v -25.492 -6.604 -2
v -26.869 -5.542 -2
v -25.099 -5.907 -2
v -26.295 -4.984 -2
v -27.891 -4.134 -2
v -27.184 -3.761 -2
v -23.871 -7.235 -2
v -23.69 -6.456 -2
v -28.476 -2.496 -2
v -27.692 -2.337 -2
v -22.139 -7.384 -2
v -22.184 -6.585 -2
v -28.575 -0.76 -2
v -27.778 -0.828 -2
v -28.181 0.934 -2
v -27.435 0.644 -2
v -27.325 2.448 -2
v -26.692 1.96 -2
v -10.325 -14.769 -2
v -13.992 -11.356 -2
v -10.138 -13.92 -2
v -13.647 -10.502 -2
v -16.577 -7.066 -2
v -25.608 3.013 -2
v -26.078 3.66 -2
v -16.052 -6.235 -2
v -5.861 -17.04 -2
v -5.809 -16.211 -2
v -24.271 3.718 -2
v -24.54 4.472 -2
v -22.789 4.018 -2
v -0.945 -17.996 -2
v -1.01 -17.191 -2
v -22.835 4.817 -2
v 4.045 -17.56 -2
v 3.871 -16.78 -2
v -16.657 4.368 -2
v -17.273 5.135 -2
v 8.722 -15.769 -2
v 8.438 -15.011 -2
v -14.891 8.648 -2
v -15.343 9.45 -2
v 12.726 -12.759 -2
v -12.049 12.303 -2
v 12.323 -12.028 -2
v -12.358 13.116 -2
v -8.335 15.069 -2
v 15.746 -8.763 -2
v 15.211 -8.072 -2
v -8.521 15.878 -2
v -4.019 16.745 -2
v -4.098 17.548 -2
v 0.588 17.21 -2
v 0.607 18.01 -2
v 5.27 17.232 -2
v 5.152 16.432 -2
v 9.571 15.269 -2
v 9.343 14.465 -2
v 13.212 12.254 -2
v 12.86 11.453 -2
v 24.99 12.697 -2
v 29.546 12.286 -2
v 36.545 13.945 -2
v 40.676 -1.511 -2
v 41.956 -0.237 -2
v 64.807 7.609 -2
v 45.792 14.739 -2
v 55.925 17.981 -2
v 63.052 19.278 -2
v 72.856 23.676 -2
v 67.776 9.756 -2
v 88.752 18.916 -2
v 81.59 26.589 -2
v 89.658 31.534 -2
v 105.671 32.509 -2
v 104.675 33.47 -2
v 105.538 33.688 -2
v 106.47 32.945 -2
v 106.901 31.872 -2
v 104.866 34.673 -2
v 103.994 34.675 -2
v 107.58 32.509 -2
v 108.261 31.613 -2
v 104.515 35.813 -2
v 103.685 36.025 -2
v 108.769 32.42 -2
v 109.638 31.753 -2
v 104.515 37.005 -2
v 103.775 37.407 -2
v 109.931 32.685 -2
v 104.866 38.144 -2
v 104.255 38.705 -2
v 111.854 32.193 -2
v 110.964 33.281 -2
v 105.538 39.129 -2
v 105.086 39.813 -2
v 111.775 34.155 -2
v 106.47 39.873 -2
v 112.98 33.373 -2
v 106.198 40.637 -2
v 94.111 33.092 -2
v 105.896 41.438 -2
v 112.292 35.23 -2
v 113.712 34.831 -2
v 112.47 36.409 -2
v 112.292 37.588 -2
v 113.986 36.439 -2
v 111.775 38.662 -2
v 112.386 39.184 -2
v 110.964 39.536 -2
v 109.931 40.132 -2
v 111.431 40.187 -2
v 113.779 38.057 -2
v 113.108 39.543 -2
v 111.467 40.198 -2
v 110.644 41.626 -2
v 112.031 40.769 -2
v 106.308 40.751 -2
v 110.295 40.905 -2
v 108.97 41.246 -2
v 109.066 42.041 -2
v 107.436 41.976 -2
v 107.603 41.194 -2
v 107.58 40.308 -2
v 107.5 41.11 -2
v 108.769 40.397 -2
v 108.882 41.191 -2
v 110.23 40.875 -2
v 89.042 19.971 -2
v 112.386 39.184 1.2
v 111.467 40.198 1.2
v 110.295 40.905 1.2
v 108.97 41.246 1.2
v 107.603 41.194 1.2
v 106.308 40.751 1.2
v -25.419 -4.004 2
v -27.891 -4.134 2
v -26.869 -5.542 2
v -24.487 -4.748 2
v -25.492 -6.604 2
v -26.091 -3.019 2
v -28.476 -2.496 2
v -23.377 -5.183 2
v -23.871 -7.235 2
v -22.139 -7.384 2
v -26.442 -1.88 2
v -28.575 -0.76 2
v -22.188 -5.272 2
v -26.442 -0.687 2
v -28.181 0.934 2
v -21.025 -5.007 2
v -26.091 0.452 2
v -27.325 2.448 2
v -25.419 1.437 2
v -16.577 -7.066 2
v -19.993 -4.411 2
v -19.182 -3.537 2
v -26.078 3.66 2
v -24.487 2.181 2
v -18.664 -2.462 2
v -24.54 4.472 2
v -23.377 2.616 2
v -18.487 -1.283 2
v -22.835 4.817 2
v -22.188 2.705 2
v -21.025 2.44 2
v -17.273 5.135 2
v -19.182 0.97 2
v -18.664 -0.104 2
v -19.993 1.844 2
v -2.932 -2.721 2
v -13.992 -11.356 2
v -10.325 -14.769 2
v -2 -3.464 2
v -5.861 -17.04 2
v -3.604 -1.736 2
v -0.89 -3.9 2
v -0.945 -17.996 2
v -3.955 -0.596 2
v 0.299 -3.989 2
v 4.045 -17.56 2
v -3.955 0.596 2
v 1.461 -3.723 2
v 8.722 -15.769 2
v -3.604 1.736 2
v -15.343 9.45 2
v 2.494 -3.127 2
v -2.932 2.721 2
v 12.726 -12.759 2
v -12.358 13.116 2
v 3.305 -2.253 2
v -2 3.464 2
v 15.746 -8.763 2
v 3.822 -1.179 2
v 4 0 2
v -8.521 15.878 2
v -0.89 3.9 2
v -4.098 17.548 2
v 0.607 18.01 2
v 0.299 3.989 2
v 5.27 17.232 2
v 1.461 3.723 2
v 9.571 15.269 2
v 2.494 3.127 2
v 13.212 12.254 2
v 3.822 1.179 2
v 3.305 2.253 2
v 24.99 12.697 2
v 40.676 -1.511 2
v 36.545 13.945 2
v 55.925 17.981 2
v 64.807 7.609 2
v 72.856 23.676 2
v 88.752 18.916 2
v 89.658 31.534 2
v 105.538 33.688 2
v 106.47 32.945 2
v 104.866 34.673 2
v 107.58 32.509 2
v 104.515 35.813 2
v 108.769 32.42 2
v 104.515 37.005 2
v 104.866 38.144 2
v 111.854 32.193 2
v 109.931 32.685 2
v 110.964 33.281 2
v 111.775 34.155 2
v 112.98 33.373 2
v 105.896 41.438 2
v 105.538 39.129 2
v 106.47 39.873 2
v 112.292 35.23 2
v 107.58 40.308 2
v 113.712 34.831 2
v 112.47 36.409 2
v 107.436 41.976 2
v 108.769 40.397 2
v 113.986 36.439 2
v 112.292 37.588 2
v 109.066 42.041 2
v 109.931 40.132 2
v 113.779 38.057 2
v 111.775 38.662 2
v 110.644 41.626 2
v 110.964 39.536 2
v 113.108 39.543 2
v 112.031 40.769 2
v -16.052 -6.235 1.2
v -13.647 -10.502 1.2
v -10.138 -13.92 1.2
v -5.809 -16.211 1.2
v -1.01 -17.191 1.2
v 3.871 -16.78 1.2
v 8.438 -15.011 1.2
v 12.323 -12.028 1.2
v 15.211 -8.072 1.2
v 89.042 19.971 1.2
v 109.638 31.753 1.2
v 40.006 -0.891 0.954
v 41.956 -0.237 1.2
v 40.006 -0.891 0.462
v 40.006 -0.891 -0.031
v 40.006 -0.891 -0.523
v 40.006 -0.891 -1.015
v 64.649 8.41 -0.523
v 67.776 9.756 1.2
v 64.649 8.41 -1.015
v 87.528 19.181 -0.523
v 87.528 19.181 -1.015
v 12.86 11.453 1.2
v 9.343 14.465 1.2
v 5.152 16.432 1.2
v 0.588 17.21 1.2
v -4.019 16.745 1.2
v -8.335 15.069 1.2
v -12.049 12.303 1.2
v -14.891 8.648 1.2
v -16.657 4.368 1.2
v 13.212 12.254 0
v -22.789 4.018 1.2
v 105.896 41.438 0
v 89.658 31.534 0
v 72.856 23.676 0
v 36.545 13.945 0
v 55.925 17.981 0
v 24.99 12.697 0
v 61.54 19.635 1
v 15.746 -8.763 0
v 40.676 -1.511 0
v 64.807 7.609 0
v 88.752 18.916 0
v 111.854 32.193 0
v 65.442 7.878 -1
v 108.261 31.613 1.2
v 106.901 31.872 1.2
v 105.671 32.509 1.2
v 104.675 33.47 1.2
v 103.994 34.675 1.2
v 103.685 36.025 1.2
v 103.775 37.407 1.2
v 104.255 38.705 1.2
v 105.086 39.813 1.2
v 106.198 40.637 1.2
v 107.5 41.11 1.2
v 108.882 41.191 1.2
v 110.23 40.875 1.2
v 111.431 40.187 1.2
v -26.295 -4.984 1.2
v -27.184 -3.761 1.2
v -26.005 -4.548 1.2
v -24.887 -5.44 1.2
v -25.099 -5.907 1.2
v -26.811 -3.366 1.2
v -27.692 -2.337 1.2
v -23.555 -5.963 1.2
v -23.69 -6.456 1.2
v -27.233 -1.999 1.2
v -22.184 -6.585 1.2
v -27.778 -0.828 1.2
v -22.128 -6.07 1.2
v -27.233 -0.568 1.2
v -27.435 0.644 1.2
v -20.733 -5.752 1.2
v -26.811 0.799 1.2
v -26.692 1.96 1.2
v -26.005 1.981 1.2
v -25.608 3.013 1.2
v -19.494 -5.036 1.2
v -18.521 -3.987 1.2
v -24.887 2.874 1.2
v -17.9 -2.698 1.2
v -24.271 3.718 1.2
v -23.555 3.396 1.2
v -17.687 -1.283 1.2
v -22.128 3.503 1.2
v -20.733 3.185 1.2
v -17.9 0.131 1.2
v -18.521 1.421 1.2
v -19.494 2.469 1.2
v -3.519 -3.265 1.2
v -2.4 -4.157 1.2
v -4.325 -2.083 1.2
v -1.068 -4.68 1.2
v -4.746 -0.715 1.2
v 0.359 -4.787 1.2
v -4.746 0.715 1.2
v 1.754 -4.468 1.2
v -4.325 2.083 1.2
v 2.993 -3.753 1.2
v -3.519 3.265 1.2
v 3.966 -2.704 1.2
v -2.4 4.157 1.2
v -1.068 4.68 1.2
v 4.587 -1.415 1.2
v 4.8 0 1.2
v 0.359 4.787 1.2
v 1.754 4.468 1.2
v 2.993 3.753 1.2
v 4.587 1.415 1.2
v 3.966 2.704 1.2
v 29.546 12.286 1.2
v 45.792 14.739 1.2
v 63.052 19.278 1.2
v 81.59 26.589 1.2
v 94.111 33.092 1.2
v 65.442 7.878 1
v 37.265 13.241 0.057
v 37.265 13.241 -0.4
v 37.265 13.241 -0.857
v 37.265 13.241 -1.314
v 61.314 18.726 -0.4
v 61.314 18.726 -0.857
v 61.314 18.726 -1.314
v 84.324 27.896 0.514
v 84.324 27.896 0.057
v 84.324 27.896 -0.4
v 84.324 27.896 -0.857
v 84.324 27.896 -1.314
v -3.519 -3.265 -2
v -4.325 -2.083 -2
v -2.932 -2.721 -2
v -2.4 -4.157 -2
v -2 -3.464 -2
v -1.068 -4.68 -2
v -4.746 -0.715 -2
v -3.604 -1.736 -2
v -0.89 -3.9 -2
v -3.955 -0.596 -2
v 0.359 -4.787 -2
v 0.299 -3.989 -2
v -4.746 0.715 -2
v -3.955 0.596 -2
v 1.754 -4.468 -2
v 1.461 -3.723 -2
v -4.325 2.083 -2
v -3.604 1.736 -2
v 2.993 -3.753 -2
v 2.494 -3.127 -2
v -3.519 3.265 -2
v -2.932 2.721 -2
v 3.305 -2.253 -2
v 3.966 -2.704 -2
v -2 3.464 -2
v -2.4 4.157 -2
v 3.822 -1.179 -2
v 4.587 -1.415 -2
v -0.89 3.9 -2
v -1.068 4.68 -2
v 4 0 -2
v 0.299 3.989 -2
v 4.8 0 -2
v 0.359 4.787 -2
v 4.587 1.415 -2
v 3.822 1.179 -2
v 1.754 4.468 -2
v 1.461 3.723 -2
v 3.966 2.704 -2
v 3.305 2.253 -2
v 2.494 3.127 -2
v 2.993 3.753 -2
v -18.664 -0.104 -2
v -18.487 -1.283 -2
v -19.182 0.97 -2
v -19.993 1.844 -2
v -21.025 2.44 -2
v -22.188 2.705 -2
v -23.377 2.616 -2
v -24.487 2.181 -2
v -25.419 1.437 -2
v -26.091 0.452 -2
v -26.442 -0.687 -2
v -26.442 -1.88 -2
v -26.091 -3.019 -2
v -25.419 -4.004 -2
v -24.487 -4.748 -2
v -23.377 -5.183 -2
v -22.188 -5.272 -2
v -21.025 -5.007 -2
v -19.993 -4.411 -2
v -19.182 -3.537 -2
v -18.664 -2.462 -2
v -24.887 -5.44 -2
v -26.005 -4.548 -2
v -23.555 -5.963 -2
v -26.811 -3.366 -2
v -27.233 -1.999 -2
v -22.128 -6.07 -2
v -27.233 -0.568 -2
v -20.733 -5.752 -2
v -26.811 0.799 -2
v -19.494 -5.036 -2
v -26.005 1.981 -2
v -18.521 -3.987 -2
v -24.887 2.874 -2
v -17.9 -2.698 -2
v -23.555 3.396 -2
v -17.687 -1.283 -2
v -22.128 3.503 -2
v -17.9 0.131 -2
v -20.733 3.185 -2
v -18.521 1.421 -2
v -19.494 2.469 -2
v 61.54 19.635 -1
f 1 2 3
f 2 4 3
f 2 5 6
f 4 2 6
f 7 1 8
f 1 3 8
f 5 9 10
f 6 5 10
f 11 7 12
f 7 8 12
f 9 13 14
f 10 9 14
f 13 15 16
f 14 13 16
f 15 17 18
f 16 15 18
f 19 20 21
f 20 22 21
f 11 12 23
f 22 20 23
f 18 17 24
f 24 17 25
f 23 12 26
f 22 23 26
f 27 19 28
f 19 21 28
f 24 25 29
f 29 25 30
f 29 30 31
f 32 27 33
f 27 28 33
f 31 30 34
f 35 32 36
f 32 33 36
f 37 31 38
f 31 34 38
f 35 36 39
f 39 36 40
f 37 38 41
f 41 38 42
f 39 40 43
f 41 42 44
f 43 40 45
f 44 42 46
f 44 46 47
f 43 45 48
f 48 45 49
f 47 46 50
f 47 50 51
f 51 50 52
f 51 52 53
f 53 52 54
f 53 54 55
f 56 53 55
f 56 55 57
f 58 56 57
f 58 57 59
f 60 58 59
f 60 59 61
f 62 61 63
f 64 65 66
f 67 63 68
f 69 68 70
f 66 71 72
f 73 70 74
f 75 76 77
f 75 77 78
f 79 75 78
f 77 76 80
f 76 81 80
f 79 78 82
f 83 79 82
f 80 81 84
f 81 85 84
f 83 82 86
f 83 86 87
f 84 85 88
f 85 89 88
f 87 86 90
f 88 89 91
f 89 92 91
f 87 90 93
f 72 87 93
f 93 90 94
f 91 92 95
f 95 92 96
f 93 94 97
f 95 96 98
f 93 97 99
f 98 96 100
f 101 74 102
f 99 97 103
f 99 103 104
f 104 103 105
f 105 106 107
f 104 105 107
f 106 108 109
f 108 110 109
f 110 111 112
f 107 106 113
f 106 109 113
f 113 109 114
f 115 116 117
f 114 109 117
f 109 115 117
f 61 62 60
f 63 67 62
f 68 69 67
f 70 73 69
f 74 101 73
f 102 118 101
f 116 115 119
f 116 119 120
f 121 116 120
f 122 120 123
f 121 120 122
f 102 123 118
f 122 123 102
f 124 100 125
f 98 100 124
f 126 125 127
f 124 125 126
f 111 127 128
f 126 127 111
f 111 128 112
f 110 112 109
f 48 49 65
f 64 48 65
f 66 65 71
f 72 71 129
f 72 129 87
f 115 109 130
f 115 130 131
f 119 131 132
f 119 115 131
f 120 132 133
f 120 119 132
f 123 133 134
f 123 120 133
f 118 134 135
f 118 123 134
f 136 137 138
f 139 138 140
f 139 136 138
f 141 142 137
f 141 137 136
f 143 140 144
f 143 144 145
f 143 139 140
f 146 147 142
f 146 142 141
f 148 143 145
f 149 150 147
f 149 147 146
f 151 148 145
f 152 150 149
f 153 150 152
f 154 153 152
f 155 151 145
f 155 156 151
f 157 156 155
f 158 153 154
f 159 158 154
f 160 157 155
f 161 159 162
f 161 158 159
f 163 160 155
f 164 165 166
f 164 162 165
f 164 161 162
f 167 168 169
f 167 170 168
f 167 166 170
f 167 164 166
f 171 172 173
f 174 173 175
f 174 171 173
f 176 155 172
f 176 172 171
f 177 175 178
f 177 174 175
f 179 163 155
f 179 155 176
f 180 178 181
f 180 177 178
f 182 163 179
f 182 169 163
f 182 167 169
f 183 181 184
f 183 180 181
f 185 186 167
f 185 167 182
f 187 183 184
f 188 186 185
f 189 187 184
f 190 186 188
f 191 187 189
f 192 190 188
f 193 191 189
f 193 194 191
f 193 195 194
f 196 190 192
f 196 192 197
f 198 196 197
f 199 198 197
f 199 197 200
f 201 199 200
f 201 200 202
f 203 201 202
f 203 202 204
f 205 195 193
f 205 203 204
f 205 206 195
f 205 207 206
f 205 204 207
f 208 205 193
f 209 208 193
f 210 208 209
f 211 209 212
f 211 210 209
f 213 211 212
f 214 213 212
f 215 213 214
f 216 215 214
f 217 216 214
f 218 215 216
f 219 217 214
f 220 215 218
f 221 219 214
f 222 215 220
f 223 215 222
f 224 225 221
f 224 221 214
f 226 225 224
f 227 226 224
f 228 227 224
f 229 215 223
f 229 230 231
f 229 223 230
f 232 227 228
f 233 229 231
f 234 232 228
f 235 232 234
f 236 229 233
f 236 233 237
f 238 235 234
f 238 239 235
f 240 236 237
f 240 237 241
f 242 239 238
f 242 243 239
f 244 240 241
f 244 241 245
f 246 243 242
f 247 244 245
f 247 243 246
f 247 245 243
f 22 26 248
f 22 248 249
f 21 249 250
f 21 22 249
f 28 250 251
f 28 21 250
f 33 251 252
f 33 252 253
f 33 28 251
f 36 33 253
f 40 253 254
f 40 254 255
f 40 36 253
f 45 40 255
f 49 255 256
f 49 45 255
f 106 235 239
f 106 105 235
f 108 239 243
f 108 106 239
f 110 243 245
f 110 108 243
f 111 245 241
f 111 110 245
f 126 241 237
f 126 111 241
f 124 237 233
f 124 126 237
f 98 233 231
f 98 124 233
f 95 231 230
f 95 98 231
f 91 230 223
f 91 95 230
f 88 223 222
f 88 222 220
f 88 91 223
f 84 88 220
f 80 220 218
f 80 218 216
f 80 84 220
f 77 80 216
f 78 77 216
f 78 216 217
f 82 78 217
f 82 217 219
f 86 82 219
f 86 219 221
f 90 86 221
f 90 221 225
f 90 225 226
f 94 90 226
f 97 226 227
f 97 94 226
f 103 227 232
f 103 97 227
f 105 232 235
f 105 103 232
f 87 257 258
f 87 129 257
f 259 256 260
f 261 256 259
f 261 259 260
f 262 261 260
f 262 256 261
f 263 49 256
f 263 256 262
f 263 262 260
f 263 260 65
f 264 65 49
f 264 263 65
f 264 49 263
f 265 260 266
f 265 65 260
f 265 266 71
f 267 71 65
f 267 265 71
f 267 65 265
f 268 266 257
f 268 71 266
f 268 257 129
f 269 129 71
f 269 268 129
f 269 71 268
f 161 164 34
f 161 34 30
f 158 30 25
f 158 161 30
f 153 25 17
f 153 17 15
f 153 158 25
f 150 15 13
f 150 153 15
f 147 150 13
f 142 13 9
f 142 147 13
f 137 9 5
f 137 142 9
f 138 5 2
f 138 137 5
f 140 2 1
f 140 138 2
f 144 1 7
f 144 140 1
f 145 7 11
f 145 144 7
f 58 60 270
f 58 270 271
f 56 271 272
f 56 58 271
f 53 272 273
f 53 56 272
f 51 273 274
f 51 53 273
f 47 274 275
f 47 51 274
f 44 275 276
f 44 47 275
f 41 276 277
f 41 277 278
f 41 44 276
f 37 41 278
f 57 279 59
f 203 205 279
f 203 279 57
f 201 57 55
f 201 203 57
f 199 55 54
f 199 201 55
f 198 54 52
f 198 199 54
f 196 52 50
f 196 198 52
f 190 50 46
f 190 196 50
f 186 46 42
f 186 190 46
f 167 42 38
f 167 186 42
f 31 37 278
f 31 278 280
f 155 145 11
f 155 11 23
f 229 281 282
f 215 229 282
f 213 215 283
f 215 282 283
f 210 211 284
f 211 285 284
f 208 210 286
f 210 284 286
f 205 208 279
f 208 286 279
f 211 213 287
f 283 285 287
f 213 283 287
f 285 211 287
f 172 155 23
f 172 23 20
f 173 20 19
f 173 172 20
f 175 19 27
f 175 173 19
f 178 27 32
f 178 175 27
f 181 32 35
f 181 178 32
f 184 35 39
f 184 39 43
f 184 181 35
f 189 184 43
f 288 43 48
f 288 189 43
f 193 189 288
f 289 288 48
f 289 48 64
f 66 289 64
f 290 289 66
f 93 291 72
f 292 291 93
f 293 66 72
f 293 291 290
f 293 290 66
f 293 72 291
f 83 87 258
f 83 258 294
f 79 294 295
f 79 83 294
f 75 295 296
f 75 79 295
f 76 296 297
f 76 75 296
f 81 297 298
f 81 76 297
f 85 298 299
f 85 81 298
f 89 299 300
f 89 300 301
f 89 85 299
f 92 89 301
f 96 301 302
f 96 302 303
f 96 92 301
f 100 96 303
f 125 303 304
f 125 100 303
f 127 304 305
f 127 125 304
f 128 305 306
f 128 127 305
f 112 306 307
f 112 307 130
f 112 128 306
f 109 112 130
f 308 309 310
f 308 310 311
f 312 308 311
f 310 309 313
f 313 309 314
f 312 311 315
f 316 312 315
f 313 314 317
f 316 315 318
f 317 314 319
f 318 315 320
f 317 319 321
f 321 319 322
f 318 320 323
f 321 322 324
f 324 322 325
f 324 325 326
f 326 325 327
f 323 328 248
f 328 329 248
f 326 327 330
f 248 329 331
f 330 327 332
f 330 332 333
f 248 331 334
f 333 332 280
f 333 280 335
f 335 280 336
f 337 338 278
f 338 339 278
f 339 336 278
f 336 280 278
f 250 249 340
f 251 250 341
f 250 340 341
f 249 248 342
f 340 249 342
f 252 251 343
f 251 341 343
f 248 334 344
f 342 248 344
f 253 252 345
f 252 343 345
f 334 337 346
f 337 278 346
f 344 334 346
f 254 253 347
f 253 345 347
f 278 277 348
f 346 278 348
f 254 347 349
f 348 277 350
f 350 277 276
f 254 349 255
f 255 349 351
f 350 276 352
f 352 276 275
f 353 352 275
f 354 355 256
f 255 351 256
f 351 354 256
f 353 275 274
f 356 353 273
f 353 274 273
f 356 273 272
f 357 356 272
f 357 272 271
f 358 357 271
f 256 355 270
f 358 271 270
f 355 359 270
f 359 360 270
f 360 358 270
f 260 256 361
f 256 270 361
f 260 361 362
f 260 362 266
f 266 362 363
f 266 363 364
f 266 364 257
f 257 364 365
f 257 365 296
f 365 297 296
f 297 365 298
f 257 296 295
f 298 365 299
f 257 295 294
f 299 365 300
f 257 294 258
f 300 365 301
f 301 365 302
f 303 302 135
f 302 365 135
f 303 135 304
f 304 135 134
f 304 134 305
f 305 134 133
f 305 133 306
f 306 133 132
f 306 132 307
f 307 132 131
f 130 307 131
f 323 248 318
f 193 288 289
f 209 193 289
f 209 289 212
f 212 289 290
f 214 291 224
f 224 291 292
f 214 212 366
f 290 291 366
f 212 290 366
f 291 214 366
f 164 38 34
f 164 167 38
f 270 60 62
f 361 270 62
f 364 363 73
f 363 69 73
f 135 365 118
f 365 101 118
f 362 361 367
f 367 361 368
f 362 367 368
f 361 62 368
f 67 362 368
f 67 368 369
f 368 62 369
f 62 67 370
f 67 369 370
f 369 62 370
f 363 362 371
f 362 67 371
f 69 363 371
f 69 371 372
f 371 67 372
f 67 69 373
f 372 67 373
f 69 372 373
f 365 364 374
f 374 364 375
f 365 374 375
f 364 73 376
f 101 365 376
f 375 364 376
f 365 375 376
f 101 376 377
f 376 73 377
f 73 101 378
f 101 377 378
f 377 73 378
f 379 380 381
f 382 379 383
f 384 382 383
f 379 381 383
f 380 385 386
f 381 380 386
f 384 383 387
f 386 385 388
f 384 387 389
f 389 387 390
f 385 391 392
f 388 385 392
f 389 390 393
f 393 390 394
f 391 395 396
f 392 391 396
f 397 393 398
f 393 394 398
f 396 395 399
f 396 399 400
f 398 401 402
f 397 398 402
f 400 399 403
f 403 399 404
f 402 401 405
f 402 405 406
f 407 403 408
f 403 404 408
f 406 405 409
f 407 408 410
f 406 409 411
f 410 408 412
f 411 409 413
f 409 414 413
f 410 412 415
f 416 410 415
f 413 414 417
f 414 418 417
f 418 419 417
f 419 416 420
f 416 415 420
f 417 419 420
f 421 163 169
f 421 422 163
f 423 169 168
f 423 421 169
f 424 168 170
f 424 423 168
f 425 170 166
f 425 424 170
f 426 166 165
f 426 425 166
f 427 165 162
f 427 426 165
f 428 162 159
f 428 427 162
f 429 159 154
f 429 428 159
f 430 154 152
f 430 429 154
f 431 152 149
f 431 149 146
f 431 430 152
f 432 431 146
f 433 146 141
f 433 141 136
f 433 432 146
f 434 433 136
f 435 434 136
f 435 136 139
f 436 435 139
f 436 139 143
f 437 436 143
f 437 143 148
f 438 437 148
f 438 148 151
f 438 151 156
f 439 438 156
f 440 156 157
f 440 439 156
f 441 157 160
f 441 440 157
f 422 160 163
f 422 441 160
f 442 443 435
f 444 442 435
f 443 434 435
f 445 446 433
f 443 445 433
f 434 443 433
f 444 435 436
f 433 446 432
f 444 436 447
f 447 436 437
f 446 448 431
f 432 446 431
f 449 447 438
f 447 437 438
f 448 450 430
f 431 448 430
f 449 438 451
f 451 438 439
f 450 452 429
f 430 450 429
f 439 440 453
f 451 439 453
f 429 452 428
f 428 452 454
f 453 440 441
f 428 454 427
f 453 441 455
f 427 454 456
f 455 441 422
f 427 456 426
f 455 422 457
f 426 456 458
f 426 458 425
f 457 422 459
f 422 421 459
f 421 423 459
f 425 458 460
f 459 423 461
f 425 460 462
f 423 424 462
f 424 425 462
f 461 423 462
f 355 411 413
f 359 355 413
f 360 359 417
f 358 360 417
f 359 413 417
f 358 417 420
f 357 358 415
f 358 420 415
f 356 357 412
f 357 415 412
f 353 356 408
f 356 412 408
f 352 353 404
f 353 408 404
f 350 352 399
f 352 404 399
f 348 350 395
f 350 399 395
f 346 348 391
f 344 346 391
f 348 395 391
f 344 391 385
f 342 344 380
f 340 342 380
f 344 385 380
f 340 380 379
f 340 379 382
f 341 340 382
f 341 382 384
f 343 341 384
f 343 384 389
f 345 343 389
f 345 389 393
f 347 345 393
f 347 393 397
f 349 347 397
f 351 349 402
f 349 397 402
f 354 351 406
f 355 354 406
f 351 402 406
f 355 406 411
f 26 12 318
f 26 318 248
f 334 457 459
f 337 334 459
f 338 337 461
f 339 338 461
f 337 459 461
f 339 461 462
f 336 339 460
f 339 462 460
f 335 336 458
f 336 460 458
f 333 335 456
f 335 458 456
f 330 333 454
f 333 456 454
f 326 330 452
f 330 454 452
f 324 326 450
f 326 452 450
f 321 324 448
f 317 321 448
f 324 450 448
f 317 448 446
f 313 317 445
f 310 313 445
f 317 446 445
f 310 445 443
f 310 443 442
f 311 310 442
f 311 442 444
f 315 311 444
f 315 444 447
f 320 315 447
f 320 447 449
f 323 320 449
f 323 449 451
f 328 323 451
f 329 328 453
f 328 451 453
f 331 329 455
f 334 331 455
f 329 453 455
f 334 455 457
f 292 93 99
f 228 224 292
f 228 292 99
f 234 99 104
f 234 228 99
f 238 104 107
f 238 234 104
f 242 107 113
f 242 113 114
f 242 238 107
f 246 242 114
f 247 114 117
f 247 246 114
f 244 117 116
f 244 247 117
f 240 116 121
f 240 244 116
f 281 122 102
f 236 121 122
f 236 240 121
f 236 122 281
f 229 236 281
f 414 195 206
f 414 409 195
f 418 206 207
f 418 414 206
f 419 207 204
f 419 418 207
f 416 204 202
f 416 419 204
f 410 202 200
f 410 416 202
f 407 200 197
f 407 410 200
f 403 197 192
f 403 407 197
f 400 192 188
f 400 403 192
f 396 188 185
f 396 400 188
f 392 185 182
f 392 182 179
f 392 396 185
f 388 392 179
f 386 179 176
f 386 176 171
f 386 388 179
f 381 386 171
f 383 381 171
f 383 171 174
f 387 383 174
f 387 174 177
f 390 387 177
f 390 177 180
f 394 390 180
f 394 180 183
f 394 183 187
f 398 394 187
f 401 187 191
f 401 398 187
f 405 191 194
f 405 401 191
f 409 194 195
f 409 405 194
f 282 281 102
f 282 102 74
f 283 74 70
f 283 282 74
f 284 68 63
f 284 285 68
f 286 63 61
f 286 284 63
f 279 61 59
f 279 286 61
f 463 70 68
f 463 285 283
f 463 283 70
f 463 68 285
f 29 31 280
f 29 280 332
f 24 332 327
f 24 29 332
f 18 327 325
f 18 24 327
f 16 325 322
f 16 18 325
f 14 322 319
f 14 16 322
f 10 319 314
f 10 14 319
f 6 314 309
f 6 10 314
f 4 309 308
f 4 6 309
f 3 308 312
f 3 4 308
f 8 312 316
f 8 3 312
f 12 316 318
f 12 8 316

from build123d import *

# Parameters (mm, degrees)
SKETCH1_R           = 4
BOSS_EXTRUDE1_DEPTH = 2
SHELL1_START        = -2
SHELL1_OUTLINE_R    = 4.8
SHELL1_DEPTH        = 3.2


# Read off the part's stored shape, not the designer's step: Shell1
with BuildPart() as part:
    # Sketch1 → Boss-Extrude1 (new, symmetric)
    with BuildSketch(Plane.XY):
        with BuildLine():
            Line((-17.273333042, 5.134508518), (-22.834943086, 4.817083449))
            ThreePointArc((-22.834943086, 4.817083449), (-28.587261134, -1.63159827), (-22.138579415, -7.383916318))
            Line((-22.138579415, -7.383916318), (-16.576969371, -7.066491249))
            ThreePointArc((-16.576969371, -7.066491249), (-0.944763396, -17.995517059), (15.7458991, -8.7634396))
            add(Edge.make_bspline(
                [(15.7458991, -8.7634396), (67.083909385, 4.041585312), (111.853607553, 32.193205755)],
                knots=[0, 0, 0, 1, 1, 1], degree=2))
            ThreePointArc((111.853607553, 32.193205755), (113.10751986, 39.543134952), (105.896265572, 41.438277917))
            add(Edge.make_bspline(
                [(105.896265572, 41.438277917), (63.525953211, 12.424095607), (13.212454281, 12.254071322)],
                knots=[0.987896241, 0.987896241, 0.987896241, 1.987896241, 1.987896241, 1.987896241], degree=2))
            ThreePointArc((13.212454281, 12.254071322), (-4.098137102, 17.548119112), (-17.273333042, 5.134508518))
        make_face()
        with Locations((-22.486761251, -1.283416434)):
            Circle(SKETCH1_R, mode=Mode.SUBTRACT)
        Circle(SKETCH1_R, mode=Mode.SUBTRACT)
        with Locations((108.469927907, 36.408671583)):
            Circle(SKETCH1_R, mode=Mode.SUBTRACT)
    extrude(amount=BOSS_EXTRUDE1_DEPTH, both=True)

    # Shell1 outline → Shell1 (cut)
    with BuildSketch(Plane.XY.offset(SHELL1_START)):
        with BuildLine():
            ThreePointArc((-16.051816298, -6.235216567), (-1.010183418, -17.190644594), (15.211053739, -8.072334002))
            add(Edge.make_bspline(
                [(15.211053739, -8.072334002), (15.222385933, -8.06950746), (15.233718127, -8.066680918), (15.245050322, -8.063854377), (15.256382516, -8.061027835), (15.26771471, -8.058201293), (15.279046904, -8.055374751), (15.290379098, -8.05254821), (15.301711293, -8.049721668), (15.313043487, -8.046895126), (15.324375681, -8.044068584), (15.354121011, -8.036649331), (15.372534147, -8.03205662), (15.390947283, -8.027463909), (15.409360418, -8.022871197), (15.427773554, -8.018278486), (15.44618669, -8.013685775), (15.464599826, -8.009093063), (15.483012962, -8.004500352), (15.501426097, -7.999907641), (15.519839233, -7.995314929), (15.540554011, -7.990148129), (15.542858699, -7.989573289), (15.545136117, -7.989005183), (15.547530208, -7.988408212), (15.549617399, -7.987887312), (15.552237019, -7.987234194), (15.554249413, -7.98673216), (15.556693958, -7.986122386), (15.558944951, -7.985560901), (15.5612476, -7.984986493), (15.56583998, -7.983840868), (15.568136163, -7.983268038), (15.570432338, -7.982695192), (15.572728507, -7.982122328), (15.575024668, -7.981549448), (15.577320821, -7.980976551), (15.579616968, -7.980403637), (15.581913107, -7.979830706), (15.584209239, -7.979257758), (15.586505364, -7.978684793), (15.593393716, -7.976965848), (15.597985921, -7.975819817), (15.602578098, -7.974673718), (15.607170246, -7.973527552), (15.611762364, -7.972381317), (15.616354454, -7.971235016), (15.620946514, -7.970088646), (15.625538546, -7.968942209), (15.630130548, -7.967795704), (15.634722521, -7.966649131), (15.648498354, -7.96320921), (15.657682126, -7.960915659), (15.666865782, -7.958621837), (15.676049322, -7.956327744), (15.685232745, -7.954033381), (15.694416052, -7.951738746), (15.703599244, -7.949443841), (15.712782318, -7.947148666), (15.721965277, -7.944853219), (15.731148119, -7.942557502), (15.77706175, -7.931077562), (15.813790795, -7.921889279), (15.85051798, -7.912696664), (15.887243306, -7.903499717), (15.923966772, -7.894298439), (15.960688378, -7.885092829), (15.997408124, -7.875882887), (16.034126012, -7.866668613), (16.070842039, -7.857450008), (16.107556207, -7.848227071), (16.291117748, -7.802090727), (16.437937227, -7.765112345), (16.584726952, -7.728064656), (16.731486924, -7.690947659), (16.878217144, -7.653761355), (17.02491761, -7.616505744), (17.171588325, -7.579180826), (17.318229287, -7.5417866), (17.464840497, -7.504323068), (17.611421956, -7.466790228), (18.05107708, -7.353983788), (18.34406149, -7.278502266), (18.636926899, -7.202743515), (18.929673307, -7.126707537), (19.222300717, -7.050394331), (19.514809132, -6.973803896), (19.807198553, -6.896936234), (20.099468984, -6.819791344), (20.391620426, -6.742369227), (20.683652882, -6.664669882), (21.559393298, -6.430740165), (22.142744307, -6.273678112), (22.725619399, -6.11550715), (23.308018593, -5.956227279), (23.889941907, -5.795838499), (24.471389362, -5.63434081), (25.052360976, -5.471734213), (25.632856767, -5.308018707), (26.212876755, -5.143194292), (26.792420958, -4.977260969), (28.529626269, -4.476134272), (29.68586008, -4.137614183), (30.84019098, -3.794658457), (31.992619122, -3.447267078), (33.143144661, -3.095440033), (34.29176775, -2.739177308), (35.438488542, -2.378478888), (36.583307191, -2.01334476), (37.726223851, -1.64377491), (38.867238673, -1.269769323), (42.284578093, -0.134445311), (44.55519768, 0.640180196), (46.818211791, 1.432548876), (49.073621643, 2.242661072), (51.32142845, 3.070517125), (53.561633431, 3.916117378), (55.794237801, 4.779462172), (58.019242777, 5.660551849), (60.236649574, 6.559386751), (62.44645941, 7.47596722), (68.878655155, 10.20493448), (73.080612538, 12.065048094), (77.254554243, 13.99063813), (81.400488497, 15.981708647), (85.518423161, 18.038264067), (89.608365726, 20.16030918), (93.67032332, 22.347849143), (97.704302702, 24.600889477), (101.710310261, 26.919436071), (105.688352025, 29.30349518), (109.638433649, 31.753073424)],
                knots=[-0.003323428, -0.003323428, -0.003323428, -0.003323428, -0.003323428, -0.003323428, -0.003323428, -0.003323428, -0.003323428, -0.003323428, -0.003323428, -0.003323428, -0.002109375, -0.002109375, -0.002109375, -0.002109375, -0.002109375, -0.002109375, -0.002109375, -0.002109375, -0.002109375, -0.002109375, -0.000136719, -0.000136719, -0.000136719, -0.000136719, -0.000136719, -0.000136719, -0.000136719, -0.000136719, -0.000136719, -0.000136719, 0.000109863, 0.000109863, 0.000109863, 0.000109863, 0.000109863, 0.000109863, 0.000109863, 0.000109863, 0.000109863, 0.000109863, 0.000356445, 0.000356445, 0.000356445, 0.000356445, 0.000356445, 0.000356445, 0.000356445, 0.000356445, 0.000356445, 0.000356445, 0.000849609, 0.000849609, 0.000849609, 0.000849609, 0.000849609, 0.000849609, 0.000849609, 0.000849609, 0.000849609, 0.000849609, 0.001835937, 0.001835937, 0.001835937, 0.001835937, 0.001835937, 0.001835937, 0.001835937, 0.001835937, 0.001835937, 0.001835937, 0.00578125, 0.00578125, 0.00578125, 0.00578125, 0.00578125, 0.00578125, 0.00578125, 0.00578125, 0.00578125, 0.00578125, 0.0215625, 0.0215625, 0.0215625, 0.0215625, 0.0215625, 0.0215625, 0.0215625, 0.0215625, 0.0215625, 0.0215625, 0.053125, 0.053125, 0.053125, 0.053125, 0.053125, 0.053125, 0.053125, 0.053125, 0.053125, 0.053125, 0.11625, 0.11625, 0.11625, 0.11625, 0.11625, 0.11625, 0.11625, 0.11625, 0.11625, 0.11625, 0.2425, 0.2425, 0.2425, 0.2425, 0.2425, 0.2425, 0.2425, 0.2425, 0.2425, 0.2425, 0.495, 0.495, 0.495, 0.495, 0.495, 0.495, 0.495, 0.495, 0.495, 0.495, 0.979998426, 0.979998426, 0.979998426, 0.979998426, 0.979998426, 0.979998426, 0.979998426, 0.979998426, 0.979998426, 0.979998426, 0.979998426, 0.979998426], degree=11))
            ThreePointArc((109.638433649, 31.753073424), (103.967828672, 38.073334454), (112.386109536, 39.184193417))
            ThreePointArc((112.386109536, 39.184193417), (109.645338699, 41.123948782), (106.30837764, 40.75089845))
            add(Edge.make_bspline(
                [(12.859642213, 11.452874497), (12.875559482, 11.452928286), (12.89147675, 11.452982075), (12.907394019, 11.453035864), (12.923311287, 11.453089654), (12.939228556, 11.453143443), (12.955145825, 11.453197232), (12.971063093, 11.453251021), (12.986980362, 11.45330481), (13.024953461, 11.453433133), (13.047009292, 11.453507666), (13.069065122, 11.453582199), (13.091120953, 11.453656732), (13.113176784, 11.453731266), (13.135232614, 11.453805799), (13.157288445, 11.453880332), (13.179344276, 11.453954865), (13.202778596, 11.454034057), (13.204157085, 11.454038715), (13.205535575, 11.454043373), (13.206914064, 11.454048032), (13.208292554, 11.45405269), (13.209671043, 11.454057348), (13.211049532, 11.454062007), (13.212428022, 11.454066665), (13.215185001, 11.454075982), (13.216554492, 11.454080606), (13.217987164, 11.45408545), (13.219302057, 11.454089949), (13.220750975, 11.45409485), (13.222097481, 11.454099473), (13.223496126, 11.454104254), (13.224878499, 11.454109002), (13.229032762, 11.454123302), (13.231802257, 11.454132885), (13.234571739, 11.454142516), (13.237341208, 11.454152197), (13.240110663, 11.454161926), (13.242880105, 11.454171704), (13.245649534, 11.454181531), (13.248418949, 11.454191408), (13.256727156, 11.454221183), (13.262265907, 11.454241229), (13.267804605, 11.454261471), (13.273343249, 11.454281908), (13.278881841, 11.454302541), (13.284420379, 11.45432337), (13.289958865, 11.454344395), (13.295497296, 11.454365616), (13.312112433, 11.454429865), (13.323188978, 11.45447348), (13.33426531, 11.454517879), (13.345341429, 11.45456306), (13.356417336, 11.454609025), (13.36749303, 11.454655773), (13.378568511, 11.454703304), (13.389643779, 11.454751618), (13.445019058, 11.454997102), (13.489315877, 11.455206018), (13.533609292, 11.455427463), (13.577899303, 11.455661437), (13.62218591, 11.455907939), (13.666469113, 11.45616697), (13.710748913, 11.456438529), (13.755025308, 11.456722618), (13.976390262, 11.458205705), (14.153427758, 11.459592636), (14.330410785, 11.461180031), (14.50733934, 11.46296789), (14.684213418, 11.464956217), (14.861033018, 11.467145013), (15.037798135, 11.469534279), (15.214508768, 11.472124018), (15.7444772, 11.480494658), (16.097571535, 11.486876983), (16.450447892, 11.494061221), (16.803106245, 11.502047384), (17.155546567, 11.510835488), (17.507768833, 11.520425545), (17.859773016, 11.53081757), (18.211559091, 11.542011578), (19.266262913, 11.577999586), (19.968526266, 11.605199584), (20.669916866, 11.635607671), (21.370434487, 11.669223941), (22.070078905, 11.706048488), (22.768849895, 11.746081409), (23.466747231, 11.789322799), (24.163770688, 11.835772751), (26.252218749, 11.984748583), (27.641021145, 12.096900641), (29.026325206, 12.221887985), (30.408128907, 12.359711064), (31.786430221, 12.510370327), (33.161227125, 12.673866223), (34.532517592, 12.850199202), (35.900299598, 13.039369712), (39.993114157, 13.645395185), (42.707615071, 14.100763008), (45.408056156, 14.607483418), (48.094419774, 15.16555678), (50.76668835, 15.774982078), (53.424844378, 16.435756921), (56.068870417, 17.147877537), (58.698749092, 17.911338773), (66.541035798, 20.354212331), (71.711057703, 22.187245864), (76.824392267, 24.225184187), (81.880917363, 26.467954887), (86.880527203, 28.915468978), (91.823134257, 31.567626244), (96.708671175, 34.424320569), (101.53709271, 37.485445273), (106.30837764, 40.75089845)],
                knots=[-0.003533003, -0.003533003, -0.003533003, -0.003533003, -0.003533003, -0.003533003, -0.003533003, -0.003533003, -0.003533003, -0.003533003, -0.002109375, -0.002109375, -0.002109375, -0.002109375, -0.002109375, -0.002109375, -0.002109375, -0.002109375, -0.000136719, -0.000136719, -0.000136719, -0.000136719, -0.000136719, -0.000136719, -0.000136719, -0.000136719, -1.3428e-05, -1.3428e-05, -1.3428e-05, -1.3428e-05, -1.3428e-05, -1.3428e-05, -1.3428e-05, -1.3428e-05, 0.000109863, 0.000109863, 0.000109863, 0.000109863, 0.000109863, 0.000109863, 0.000109863, 0.000109863, 0.000356445, 0.000356445, 0.000356445, 0.000356445, 0.000356445, 0.000356445, 0.000356445, 0.000356445, 0.000849609, 0.000849609, 0.000849609, 0.000849609, 0.000849609, 0.000849609, 0.000849609, 0.000849609, 0.001835937, 0.001835937, 0.001835937, 0.001835937, 0.001835937, 0.001835937, 0.001835937, 0.001835937, 0.00578125, 0.00578125, 0.00578125, 0.00578125, 0.00578125, 0.00578125, 0.00578125, 0.00578125, 0.0215625, 0.0215625, 0.0215625, 0.0215625, 0.0215625, 0.0215625, 0.0215625, 0.0215625, 0.053125, 0.053125, 0.053125, 0.053125, 0.053125, 0.053125, 0.053125, 0.053125, 0.11625, 0.11625, 0.11625, 0.11625, 0.11625, 0.11625, 0.11625, 0.11625, 0.2425, 0.2425, 0.2425, 0.2425, 0.2425, 0.2425, 0.2425, 0.2425, 0.495, 0.495, 0.495, 0.495, 0.495, 0.495, 0.495, 0.495, 0.999531309, 0.999531309, 0.999531309, 0.999531309, 0.999531309, 0.999531309, 0.999531309, 0.999531309, 0.999531309, 0.999531309], degree=9))
            ThreePointArc((12.859642213, 11.452874497), (-4.019017915, 16.744737295), (-16.657009441, 4.368382832))
            Line((-16.657009441, 4.368382832), (-22.789357823, 4.018383265))
            ThreePointArc((-22.789357823, 4.018383265), (-27.78856095, -1.586013006), (-22.184164679, -6.585216134))
            Line((-22.184164679, -6.585216134), (-16.051816298, -6.235216567))
        make_face()
        with Locations((-22.486761251, -1.283416434)):
            Circle(SHELL1_OUTLINE_R, mode=Mode.SUBTRACT)
        Circle(SHELL1_OUTLINE_R, mode=Mode.SUBTRACT)
    extrude(amount=SHELL1_DEPTH, mode=Mode.SUBTRACT)


solid = part.part
